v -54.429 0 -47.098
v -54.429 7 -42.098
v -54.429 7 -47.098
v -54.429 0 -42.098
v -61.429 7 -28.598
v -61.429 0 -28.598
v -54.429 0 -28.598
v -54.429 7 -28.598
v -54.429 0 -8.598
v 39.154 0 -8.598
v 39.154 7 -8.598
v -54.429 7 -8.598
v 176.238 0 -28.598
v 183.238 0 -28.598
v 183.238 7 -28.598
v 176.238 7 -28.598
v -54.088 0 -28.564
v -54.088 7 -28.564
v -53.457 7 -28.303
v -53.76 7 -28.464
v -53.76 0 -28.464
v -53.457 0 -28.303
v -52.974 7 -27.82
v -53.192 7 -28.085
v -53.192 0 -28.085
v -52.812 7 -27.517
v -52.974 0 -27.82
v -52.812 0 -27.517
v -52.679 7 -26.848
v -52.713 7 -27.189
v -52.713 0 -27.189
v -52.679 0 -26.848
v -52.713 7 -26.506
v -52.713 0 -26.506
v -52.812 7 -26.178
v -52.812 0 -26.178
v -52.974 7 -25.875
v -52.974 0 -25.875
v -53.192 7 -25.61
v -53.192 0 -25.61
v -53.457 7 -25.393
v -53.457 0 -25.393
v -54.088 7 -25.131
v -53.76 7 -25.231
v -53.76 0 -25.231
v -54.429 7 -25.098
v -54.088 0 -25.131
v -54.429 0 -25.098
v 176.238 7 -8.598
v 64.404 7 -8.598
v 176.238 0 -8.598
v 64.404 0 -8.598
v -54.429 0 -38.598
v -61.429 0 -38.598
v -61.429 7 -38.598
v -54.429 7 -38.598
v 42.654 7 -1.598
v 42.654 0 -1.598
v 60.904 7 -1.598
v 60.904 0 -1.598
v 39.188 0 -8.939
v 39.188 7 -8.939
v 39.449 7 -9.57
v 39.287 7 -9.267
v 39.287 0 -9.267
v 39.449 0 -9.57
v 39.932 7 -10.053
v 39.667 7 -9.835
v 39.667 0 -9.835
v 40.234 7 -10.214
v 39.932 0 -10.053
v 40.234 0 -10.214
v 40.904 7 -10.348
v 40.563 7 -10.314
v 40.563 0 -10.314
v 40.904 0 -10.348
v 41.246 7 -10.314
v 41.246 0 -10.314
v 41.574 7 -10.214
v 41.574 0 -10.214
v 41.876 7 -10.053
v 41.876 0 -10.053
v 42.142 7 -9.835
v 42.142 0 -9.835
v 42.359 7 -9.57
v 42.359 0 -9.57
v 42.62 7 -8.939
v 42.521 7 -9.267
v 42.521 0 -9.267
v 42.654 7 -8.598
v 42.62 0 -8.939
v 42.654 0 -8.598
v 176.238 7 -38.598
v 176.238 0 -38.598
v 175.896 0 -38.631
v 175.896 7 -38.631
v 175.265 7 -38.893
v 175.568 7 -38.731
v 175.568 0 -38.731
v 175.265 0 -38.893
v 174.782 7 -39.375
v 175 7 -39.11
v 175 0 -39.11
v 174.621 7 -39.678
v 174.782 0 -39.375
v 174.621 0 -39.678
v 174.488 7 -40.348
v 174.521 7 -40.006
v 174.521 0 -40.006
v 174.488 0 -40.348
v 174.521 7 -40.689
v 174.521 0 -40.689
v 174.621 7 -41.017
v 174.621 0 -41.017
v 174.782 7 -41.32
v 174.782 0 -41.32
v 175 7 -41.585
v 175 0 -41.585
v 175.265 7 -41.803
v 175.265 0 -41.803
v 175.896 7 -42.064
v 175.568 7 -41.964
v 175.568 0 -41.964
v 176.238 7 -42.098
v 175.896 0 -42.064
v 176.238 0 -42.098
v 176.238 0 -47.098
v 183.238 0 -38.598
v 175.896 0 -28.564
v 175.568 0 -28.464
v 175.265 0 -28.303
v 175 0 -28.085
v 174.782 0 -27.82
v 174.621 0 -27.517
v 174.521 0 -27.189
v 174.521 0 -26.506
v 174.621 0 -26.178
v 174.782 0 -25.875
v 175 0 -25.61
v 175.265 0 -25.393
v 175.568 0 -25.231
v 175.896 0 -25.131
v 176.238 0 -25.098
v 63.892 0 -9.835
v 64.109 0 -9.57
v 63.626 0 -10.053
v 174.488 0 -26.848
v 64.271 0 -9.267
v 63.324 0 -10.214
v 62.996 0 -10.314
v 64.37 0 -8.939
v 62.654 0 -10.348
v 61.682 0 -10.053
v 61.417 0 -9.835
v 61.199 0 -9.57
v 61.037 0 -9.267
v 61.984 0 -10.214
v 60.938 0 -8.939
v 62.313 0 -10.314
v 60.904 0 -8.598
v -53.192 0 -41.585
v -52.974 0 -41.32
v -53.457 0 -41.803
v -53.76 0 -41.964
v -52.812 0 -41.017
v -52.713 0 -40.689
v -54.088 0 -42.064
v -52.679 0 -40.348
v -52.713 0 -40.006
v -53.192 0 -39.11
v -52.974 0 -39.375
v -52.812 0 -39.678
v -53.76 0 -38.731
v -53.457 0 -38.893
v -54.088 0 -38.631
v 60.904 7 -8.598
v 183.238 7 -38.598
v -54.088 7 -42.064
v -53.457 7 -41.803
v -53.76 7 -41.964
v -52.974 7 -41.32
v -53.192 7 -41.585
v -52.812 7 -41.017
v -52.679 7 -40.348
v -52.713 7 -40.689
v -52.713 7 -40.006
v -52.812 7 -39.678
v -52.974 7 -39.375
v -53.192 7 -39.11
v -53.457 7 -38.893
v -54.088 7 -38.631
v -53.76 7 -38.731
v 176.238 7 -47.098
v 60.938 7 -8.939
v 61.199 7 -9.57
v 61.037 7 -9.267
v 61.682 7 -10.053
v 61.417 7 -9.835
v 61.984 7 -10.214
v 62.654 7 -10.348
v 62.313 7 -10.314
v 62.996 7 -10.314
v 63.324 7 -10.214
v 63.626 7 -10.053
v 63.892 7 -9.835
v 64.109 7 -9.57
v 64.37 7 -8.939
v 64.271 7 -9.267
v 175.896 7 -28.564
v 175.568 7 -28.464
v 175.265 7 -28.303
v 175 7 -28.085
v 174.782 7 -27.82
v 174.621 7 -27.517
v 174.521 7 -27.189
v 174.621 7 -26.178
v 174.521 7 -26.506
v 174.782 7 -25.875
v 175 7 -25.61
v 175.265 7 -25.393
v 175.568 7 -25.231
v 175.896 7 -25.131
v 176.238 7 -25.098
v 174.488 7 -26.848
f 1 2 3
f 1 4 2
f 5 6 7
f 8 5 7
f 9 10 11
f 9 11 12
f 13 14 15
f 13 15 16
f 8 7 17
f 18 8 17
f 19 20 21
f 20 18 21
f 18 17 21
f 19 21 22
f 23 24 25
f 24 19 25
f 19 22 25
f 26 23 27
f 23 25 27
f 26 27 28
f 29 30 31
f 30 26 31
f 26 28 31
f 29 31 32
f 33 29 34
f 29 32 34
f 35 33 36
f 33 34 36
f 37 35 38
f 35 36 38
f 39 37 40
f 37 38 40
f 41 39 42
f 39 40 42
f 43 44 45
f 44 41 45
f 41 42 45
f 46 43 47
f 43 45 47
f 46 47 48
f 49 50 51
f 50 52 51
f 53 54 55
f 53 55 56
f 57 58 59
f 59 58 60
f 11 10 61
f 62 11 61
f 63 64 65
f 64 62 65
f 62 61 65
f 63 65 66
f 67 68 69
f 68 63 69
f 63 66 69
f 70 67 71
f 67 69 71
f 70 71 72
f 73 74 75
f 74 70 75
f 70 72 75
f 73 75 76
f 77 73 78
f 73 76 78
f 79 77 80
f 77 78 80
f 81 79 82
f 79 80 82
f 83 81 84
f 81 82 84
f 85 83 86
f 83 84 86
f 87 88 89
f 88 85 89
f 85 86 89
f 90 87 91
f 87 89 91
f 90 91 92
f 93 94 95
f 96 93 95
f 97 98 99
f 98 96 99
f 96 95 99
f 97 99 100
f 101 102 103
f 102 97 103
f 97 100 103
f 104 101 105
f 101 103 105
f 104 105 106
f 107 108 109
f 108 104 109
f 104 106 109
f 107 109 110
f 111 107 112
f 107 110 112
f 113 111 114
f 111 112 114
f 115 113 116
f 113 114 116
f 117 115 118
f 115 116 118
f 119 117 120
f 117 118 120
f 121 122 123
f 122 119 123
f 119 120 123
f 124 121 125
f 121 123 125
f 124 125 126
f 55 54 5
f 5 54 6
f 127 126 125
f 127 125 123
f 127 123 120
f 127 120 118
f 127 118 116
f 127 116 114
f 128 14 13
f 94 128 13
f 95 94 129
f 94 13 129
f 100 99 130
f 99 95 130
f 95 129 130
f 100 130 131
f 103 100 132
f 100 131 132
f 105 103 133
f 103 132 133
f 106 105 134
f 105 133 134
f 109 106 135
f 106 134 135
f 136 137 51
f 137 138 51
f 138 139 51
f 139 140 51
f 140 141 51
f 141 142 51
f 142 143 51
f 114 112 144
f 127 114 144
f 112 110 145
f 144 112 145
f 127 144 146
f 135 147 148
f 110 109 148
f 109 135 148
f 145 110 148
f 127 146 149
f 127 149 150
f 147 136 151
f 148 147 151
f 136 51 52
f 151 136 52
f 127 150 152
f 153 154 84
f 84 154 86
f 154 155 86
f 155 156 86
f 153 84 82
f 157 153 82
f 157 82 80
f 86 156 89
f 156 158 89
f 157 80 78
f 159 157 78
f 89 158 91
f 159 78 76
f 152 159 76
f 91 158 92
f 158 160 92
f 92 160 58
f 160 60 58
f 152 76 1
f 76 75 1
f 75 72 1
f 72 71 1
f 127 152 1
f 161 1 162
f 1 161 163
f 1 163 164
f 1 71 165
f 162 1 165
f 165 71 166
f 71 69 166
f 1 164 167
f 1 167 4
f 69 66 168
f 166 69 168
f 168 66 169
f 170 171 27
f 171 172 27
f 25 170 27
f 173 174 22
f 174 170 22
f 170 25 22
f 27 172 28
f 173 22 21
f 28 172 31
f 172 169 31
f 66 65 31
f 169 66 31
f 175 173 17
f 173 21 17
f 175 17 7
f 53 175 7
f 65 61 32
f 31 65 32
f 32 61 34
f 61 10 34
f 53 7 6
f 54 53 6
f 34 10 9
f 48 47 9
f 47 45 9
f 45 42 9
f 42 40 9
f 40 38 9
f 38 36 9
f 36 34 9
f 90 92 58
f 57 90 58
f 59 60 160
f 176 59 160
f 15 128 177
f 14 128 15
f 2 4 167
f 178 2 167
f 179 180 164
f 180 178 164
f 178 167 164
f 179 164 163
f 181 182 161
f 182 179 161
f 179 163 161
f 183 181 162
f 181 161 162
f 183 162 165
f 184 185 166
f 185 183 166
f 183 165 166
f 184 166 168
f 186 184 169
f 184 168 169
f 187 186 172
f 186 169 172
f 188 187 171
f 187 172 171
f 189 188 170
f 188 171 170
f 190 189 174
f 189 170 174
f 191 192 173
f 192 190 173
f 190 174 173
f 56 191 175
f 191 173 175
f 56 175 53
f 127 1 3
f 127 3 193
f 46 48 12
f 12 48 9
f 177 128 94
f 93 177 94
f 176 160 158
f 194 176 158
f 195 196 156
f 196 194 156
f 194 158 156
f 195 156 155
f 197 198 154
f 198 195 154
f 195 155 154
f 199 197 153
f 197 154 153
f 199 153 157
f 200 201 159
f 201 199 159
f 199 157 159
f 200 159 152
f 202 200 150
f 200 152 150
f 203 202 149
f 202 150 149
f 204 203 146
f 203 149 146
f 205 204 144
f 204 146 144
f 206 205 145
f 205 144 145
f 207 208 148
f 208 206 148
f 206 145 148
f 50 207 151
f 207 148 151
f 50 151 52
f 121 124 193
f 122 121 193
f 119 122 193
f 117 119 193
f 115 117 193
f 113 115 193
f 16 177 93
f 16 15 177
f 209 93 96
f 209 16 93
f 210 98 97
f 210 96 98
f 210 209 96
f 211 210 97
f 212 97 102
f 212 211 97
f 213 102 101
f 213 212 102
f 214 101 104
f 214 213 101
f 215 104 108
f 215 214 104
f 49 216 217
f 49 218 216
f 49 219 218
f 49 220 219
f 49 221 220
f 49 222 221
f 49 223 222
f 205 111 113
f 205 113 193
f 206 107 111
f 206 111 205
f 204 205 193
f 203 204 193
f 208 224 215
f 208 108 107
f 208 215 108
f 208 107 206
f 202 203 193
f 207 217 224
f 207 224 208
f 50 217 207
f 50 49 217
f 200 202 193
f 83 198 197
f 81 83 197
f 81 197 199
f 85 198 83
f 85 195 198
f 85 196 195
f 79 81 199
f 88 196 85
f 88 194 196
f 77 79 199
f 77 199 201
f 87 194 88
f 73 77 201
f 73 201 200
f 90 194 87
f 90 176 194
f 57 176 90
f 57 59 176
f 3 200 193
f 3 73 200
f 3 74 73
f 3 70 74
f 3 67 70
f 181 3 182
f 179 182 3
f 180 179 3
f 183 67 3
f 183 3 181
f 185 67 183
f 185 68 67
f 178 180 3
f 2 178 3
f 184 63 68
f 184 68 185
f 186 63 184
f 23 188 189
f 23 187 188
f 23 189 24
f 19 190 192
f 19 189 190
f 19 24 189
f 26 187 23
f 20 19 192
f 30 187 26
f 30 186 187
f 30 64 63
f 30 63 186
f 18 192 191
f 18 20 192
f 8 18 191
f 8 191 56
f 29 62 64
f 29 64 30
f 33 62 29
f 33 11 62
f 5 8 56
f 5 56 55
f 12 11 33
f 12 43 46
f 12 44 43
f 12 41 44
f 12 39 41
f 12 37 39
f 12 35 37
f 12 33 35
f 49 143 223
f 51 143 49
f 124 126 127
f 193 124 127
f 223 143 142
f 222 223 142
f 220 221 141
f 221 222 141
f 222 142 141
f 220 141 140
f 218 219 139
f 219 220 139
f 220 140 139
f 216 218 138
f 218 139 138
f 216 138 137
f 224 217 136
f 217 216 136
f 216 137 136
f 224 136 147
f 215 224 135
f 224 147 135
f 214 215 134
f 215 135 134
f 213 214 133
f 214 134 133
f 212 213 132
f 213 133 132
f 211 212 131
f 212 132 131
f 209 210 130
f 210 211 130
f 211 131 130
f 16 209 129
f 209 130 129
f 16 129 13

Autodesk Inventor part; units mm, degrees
ref_plane "YZ Plane" through (0, 0, 0) normal (1, 0, 0) x (0, 1, 0)
ref_plane "XZ Plane" through (0, 0, 0) normal (0, 1, 0) x (-1, 0, 0)
ref_plane "XY Plane" through (0, 0, 0) normal (0, 0, 1) x (1, 0, 0)
sketch "Sketch1" plane through (0, 0, 0) normal (0, 1, 0) x (-1, 0, 0)
  arc A0 (54.4292, -38.5976) -> (54.4292, -42.0976) centre (54.4292, -40.3476) ccw
  arc A1 (54.4292, -25.0976) -> (54.4292, -28.5976) centre (54.4292, -26.8476) ccw
  line L0 (61.4292, -38.5976) -> (61.4292, -28.5976)
  line L1 (-42.6541, -8.5976) -> (-42.6541, -1.5976)
  line L2 (61.4292, -28.5976) -> (54.4292, -28.5976)
  line L3 (61.4292, -38.5976) -> (54.4292, -38.5976)
  line L4 (54.4292, -25.0976) -> (54.4292, -8.5976)
  line L5 (54.4292, -42.0976) -> (54.4292, -47.0976)
  line L6 (-60.9041, -44.0976) -> (-60.9041, -33.5976)
  arc A2 (-176.2375, -42.0976) -> (-176.2375, -38.5976) centre (-176.2375, -40.3476) ccw
  arc A3 (-176.2375, -28.5976) -> (-176.2375, -25.0976) centre (-176.2375, -26.8476) ccw
  line L7 (-183.2375, -38.5976) -> (-183.2375, -28.5976)
  line L8 (-183.2375, -28.5976) -> (-176.2375, -28.5976)
  line L9 (-183.2375, -38.5976) -> (-176.2375, -38.5976)
  line L10 (-176.2375, -25.0976) -> (-176.2375, -8.5976)
  line L11 (-176.2375, -42.0976) -> (-176.2375, -47.0976)
  line L12 (54.4292, -47.0976) -> (-176.2375, -47.0976)
  arc A4 (-42.6541, -8.5976) -> (-39.1541, -8.5976) centre (-40.9041, -8.5976) ccw
  line L13 (-39.1541, -8.5976) -> (54.4292, -8.5976)
  line L14 (-60.9041, -1.5976) -> (-60.9041, -8.5976)
  arc A5 (-64.4041, -8.5976) -> (-60.9041, -8.5976) centre (-62.6541, -8.5976) ccw
  line L15 (-64.4041, -8.5976) -> (-176.2375, -8.5976)
  line L16 (-42.6541, -1.5976) -> (-60.9041, -1.5976)
  point P0 (0, 0)
  dimension "d2" = 3.5
  dimension "d5" = 3.5
  dimension "d9" = 7
  dimension "d11" = 10
  dimension "d32" = 5
  dimension "d33" = 230.6667
  dimension "d36" = 7
  dimension "d42" = 3.5
  dimension "d43" = 97.0833
  dimension "d44" = 3.5
  dimension "d45" = 18.25
  dimension "d46" = 20
extrude "Extrusion1" add sketch "Sketch1" along normal blind 7
properties part number "Level 1 Support Mid" material "Wood (Maple)"
